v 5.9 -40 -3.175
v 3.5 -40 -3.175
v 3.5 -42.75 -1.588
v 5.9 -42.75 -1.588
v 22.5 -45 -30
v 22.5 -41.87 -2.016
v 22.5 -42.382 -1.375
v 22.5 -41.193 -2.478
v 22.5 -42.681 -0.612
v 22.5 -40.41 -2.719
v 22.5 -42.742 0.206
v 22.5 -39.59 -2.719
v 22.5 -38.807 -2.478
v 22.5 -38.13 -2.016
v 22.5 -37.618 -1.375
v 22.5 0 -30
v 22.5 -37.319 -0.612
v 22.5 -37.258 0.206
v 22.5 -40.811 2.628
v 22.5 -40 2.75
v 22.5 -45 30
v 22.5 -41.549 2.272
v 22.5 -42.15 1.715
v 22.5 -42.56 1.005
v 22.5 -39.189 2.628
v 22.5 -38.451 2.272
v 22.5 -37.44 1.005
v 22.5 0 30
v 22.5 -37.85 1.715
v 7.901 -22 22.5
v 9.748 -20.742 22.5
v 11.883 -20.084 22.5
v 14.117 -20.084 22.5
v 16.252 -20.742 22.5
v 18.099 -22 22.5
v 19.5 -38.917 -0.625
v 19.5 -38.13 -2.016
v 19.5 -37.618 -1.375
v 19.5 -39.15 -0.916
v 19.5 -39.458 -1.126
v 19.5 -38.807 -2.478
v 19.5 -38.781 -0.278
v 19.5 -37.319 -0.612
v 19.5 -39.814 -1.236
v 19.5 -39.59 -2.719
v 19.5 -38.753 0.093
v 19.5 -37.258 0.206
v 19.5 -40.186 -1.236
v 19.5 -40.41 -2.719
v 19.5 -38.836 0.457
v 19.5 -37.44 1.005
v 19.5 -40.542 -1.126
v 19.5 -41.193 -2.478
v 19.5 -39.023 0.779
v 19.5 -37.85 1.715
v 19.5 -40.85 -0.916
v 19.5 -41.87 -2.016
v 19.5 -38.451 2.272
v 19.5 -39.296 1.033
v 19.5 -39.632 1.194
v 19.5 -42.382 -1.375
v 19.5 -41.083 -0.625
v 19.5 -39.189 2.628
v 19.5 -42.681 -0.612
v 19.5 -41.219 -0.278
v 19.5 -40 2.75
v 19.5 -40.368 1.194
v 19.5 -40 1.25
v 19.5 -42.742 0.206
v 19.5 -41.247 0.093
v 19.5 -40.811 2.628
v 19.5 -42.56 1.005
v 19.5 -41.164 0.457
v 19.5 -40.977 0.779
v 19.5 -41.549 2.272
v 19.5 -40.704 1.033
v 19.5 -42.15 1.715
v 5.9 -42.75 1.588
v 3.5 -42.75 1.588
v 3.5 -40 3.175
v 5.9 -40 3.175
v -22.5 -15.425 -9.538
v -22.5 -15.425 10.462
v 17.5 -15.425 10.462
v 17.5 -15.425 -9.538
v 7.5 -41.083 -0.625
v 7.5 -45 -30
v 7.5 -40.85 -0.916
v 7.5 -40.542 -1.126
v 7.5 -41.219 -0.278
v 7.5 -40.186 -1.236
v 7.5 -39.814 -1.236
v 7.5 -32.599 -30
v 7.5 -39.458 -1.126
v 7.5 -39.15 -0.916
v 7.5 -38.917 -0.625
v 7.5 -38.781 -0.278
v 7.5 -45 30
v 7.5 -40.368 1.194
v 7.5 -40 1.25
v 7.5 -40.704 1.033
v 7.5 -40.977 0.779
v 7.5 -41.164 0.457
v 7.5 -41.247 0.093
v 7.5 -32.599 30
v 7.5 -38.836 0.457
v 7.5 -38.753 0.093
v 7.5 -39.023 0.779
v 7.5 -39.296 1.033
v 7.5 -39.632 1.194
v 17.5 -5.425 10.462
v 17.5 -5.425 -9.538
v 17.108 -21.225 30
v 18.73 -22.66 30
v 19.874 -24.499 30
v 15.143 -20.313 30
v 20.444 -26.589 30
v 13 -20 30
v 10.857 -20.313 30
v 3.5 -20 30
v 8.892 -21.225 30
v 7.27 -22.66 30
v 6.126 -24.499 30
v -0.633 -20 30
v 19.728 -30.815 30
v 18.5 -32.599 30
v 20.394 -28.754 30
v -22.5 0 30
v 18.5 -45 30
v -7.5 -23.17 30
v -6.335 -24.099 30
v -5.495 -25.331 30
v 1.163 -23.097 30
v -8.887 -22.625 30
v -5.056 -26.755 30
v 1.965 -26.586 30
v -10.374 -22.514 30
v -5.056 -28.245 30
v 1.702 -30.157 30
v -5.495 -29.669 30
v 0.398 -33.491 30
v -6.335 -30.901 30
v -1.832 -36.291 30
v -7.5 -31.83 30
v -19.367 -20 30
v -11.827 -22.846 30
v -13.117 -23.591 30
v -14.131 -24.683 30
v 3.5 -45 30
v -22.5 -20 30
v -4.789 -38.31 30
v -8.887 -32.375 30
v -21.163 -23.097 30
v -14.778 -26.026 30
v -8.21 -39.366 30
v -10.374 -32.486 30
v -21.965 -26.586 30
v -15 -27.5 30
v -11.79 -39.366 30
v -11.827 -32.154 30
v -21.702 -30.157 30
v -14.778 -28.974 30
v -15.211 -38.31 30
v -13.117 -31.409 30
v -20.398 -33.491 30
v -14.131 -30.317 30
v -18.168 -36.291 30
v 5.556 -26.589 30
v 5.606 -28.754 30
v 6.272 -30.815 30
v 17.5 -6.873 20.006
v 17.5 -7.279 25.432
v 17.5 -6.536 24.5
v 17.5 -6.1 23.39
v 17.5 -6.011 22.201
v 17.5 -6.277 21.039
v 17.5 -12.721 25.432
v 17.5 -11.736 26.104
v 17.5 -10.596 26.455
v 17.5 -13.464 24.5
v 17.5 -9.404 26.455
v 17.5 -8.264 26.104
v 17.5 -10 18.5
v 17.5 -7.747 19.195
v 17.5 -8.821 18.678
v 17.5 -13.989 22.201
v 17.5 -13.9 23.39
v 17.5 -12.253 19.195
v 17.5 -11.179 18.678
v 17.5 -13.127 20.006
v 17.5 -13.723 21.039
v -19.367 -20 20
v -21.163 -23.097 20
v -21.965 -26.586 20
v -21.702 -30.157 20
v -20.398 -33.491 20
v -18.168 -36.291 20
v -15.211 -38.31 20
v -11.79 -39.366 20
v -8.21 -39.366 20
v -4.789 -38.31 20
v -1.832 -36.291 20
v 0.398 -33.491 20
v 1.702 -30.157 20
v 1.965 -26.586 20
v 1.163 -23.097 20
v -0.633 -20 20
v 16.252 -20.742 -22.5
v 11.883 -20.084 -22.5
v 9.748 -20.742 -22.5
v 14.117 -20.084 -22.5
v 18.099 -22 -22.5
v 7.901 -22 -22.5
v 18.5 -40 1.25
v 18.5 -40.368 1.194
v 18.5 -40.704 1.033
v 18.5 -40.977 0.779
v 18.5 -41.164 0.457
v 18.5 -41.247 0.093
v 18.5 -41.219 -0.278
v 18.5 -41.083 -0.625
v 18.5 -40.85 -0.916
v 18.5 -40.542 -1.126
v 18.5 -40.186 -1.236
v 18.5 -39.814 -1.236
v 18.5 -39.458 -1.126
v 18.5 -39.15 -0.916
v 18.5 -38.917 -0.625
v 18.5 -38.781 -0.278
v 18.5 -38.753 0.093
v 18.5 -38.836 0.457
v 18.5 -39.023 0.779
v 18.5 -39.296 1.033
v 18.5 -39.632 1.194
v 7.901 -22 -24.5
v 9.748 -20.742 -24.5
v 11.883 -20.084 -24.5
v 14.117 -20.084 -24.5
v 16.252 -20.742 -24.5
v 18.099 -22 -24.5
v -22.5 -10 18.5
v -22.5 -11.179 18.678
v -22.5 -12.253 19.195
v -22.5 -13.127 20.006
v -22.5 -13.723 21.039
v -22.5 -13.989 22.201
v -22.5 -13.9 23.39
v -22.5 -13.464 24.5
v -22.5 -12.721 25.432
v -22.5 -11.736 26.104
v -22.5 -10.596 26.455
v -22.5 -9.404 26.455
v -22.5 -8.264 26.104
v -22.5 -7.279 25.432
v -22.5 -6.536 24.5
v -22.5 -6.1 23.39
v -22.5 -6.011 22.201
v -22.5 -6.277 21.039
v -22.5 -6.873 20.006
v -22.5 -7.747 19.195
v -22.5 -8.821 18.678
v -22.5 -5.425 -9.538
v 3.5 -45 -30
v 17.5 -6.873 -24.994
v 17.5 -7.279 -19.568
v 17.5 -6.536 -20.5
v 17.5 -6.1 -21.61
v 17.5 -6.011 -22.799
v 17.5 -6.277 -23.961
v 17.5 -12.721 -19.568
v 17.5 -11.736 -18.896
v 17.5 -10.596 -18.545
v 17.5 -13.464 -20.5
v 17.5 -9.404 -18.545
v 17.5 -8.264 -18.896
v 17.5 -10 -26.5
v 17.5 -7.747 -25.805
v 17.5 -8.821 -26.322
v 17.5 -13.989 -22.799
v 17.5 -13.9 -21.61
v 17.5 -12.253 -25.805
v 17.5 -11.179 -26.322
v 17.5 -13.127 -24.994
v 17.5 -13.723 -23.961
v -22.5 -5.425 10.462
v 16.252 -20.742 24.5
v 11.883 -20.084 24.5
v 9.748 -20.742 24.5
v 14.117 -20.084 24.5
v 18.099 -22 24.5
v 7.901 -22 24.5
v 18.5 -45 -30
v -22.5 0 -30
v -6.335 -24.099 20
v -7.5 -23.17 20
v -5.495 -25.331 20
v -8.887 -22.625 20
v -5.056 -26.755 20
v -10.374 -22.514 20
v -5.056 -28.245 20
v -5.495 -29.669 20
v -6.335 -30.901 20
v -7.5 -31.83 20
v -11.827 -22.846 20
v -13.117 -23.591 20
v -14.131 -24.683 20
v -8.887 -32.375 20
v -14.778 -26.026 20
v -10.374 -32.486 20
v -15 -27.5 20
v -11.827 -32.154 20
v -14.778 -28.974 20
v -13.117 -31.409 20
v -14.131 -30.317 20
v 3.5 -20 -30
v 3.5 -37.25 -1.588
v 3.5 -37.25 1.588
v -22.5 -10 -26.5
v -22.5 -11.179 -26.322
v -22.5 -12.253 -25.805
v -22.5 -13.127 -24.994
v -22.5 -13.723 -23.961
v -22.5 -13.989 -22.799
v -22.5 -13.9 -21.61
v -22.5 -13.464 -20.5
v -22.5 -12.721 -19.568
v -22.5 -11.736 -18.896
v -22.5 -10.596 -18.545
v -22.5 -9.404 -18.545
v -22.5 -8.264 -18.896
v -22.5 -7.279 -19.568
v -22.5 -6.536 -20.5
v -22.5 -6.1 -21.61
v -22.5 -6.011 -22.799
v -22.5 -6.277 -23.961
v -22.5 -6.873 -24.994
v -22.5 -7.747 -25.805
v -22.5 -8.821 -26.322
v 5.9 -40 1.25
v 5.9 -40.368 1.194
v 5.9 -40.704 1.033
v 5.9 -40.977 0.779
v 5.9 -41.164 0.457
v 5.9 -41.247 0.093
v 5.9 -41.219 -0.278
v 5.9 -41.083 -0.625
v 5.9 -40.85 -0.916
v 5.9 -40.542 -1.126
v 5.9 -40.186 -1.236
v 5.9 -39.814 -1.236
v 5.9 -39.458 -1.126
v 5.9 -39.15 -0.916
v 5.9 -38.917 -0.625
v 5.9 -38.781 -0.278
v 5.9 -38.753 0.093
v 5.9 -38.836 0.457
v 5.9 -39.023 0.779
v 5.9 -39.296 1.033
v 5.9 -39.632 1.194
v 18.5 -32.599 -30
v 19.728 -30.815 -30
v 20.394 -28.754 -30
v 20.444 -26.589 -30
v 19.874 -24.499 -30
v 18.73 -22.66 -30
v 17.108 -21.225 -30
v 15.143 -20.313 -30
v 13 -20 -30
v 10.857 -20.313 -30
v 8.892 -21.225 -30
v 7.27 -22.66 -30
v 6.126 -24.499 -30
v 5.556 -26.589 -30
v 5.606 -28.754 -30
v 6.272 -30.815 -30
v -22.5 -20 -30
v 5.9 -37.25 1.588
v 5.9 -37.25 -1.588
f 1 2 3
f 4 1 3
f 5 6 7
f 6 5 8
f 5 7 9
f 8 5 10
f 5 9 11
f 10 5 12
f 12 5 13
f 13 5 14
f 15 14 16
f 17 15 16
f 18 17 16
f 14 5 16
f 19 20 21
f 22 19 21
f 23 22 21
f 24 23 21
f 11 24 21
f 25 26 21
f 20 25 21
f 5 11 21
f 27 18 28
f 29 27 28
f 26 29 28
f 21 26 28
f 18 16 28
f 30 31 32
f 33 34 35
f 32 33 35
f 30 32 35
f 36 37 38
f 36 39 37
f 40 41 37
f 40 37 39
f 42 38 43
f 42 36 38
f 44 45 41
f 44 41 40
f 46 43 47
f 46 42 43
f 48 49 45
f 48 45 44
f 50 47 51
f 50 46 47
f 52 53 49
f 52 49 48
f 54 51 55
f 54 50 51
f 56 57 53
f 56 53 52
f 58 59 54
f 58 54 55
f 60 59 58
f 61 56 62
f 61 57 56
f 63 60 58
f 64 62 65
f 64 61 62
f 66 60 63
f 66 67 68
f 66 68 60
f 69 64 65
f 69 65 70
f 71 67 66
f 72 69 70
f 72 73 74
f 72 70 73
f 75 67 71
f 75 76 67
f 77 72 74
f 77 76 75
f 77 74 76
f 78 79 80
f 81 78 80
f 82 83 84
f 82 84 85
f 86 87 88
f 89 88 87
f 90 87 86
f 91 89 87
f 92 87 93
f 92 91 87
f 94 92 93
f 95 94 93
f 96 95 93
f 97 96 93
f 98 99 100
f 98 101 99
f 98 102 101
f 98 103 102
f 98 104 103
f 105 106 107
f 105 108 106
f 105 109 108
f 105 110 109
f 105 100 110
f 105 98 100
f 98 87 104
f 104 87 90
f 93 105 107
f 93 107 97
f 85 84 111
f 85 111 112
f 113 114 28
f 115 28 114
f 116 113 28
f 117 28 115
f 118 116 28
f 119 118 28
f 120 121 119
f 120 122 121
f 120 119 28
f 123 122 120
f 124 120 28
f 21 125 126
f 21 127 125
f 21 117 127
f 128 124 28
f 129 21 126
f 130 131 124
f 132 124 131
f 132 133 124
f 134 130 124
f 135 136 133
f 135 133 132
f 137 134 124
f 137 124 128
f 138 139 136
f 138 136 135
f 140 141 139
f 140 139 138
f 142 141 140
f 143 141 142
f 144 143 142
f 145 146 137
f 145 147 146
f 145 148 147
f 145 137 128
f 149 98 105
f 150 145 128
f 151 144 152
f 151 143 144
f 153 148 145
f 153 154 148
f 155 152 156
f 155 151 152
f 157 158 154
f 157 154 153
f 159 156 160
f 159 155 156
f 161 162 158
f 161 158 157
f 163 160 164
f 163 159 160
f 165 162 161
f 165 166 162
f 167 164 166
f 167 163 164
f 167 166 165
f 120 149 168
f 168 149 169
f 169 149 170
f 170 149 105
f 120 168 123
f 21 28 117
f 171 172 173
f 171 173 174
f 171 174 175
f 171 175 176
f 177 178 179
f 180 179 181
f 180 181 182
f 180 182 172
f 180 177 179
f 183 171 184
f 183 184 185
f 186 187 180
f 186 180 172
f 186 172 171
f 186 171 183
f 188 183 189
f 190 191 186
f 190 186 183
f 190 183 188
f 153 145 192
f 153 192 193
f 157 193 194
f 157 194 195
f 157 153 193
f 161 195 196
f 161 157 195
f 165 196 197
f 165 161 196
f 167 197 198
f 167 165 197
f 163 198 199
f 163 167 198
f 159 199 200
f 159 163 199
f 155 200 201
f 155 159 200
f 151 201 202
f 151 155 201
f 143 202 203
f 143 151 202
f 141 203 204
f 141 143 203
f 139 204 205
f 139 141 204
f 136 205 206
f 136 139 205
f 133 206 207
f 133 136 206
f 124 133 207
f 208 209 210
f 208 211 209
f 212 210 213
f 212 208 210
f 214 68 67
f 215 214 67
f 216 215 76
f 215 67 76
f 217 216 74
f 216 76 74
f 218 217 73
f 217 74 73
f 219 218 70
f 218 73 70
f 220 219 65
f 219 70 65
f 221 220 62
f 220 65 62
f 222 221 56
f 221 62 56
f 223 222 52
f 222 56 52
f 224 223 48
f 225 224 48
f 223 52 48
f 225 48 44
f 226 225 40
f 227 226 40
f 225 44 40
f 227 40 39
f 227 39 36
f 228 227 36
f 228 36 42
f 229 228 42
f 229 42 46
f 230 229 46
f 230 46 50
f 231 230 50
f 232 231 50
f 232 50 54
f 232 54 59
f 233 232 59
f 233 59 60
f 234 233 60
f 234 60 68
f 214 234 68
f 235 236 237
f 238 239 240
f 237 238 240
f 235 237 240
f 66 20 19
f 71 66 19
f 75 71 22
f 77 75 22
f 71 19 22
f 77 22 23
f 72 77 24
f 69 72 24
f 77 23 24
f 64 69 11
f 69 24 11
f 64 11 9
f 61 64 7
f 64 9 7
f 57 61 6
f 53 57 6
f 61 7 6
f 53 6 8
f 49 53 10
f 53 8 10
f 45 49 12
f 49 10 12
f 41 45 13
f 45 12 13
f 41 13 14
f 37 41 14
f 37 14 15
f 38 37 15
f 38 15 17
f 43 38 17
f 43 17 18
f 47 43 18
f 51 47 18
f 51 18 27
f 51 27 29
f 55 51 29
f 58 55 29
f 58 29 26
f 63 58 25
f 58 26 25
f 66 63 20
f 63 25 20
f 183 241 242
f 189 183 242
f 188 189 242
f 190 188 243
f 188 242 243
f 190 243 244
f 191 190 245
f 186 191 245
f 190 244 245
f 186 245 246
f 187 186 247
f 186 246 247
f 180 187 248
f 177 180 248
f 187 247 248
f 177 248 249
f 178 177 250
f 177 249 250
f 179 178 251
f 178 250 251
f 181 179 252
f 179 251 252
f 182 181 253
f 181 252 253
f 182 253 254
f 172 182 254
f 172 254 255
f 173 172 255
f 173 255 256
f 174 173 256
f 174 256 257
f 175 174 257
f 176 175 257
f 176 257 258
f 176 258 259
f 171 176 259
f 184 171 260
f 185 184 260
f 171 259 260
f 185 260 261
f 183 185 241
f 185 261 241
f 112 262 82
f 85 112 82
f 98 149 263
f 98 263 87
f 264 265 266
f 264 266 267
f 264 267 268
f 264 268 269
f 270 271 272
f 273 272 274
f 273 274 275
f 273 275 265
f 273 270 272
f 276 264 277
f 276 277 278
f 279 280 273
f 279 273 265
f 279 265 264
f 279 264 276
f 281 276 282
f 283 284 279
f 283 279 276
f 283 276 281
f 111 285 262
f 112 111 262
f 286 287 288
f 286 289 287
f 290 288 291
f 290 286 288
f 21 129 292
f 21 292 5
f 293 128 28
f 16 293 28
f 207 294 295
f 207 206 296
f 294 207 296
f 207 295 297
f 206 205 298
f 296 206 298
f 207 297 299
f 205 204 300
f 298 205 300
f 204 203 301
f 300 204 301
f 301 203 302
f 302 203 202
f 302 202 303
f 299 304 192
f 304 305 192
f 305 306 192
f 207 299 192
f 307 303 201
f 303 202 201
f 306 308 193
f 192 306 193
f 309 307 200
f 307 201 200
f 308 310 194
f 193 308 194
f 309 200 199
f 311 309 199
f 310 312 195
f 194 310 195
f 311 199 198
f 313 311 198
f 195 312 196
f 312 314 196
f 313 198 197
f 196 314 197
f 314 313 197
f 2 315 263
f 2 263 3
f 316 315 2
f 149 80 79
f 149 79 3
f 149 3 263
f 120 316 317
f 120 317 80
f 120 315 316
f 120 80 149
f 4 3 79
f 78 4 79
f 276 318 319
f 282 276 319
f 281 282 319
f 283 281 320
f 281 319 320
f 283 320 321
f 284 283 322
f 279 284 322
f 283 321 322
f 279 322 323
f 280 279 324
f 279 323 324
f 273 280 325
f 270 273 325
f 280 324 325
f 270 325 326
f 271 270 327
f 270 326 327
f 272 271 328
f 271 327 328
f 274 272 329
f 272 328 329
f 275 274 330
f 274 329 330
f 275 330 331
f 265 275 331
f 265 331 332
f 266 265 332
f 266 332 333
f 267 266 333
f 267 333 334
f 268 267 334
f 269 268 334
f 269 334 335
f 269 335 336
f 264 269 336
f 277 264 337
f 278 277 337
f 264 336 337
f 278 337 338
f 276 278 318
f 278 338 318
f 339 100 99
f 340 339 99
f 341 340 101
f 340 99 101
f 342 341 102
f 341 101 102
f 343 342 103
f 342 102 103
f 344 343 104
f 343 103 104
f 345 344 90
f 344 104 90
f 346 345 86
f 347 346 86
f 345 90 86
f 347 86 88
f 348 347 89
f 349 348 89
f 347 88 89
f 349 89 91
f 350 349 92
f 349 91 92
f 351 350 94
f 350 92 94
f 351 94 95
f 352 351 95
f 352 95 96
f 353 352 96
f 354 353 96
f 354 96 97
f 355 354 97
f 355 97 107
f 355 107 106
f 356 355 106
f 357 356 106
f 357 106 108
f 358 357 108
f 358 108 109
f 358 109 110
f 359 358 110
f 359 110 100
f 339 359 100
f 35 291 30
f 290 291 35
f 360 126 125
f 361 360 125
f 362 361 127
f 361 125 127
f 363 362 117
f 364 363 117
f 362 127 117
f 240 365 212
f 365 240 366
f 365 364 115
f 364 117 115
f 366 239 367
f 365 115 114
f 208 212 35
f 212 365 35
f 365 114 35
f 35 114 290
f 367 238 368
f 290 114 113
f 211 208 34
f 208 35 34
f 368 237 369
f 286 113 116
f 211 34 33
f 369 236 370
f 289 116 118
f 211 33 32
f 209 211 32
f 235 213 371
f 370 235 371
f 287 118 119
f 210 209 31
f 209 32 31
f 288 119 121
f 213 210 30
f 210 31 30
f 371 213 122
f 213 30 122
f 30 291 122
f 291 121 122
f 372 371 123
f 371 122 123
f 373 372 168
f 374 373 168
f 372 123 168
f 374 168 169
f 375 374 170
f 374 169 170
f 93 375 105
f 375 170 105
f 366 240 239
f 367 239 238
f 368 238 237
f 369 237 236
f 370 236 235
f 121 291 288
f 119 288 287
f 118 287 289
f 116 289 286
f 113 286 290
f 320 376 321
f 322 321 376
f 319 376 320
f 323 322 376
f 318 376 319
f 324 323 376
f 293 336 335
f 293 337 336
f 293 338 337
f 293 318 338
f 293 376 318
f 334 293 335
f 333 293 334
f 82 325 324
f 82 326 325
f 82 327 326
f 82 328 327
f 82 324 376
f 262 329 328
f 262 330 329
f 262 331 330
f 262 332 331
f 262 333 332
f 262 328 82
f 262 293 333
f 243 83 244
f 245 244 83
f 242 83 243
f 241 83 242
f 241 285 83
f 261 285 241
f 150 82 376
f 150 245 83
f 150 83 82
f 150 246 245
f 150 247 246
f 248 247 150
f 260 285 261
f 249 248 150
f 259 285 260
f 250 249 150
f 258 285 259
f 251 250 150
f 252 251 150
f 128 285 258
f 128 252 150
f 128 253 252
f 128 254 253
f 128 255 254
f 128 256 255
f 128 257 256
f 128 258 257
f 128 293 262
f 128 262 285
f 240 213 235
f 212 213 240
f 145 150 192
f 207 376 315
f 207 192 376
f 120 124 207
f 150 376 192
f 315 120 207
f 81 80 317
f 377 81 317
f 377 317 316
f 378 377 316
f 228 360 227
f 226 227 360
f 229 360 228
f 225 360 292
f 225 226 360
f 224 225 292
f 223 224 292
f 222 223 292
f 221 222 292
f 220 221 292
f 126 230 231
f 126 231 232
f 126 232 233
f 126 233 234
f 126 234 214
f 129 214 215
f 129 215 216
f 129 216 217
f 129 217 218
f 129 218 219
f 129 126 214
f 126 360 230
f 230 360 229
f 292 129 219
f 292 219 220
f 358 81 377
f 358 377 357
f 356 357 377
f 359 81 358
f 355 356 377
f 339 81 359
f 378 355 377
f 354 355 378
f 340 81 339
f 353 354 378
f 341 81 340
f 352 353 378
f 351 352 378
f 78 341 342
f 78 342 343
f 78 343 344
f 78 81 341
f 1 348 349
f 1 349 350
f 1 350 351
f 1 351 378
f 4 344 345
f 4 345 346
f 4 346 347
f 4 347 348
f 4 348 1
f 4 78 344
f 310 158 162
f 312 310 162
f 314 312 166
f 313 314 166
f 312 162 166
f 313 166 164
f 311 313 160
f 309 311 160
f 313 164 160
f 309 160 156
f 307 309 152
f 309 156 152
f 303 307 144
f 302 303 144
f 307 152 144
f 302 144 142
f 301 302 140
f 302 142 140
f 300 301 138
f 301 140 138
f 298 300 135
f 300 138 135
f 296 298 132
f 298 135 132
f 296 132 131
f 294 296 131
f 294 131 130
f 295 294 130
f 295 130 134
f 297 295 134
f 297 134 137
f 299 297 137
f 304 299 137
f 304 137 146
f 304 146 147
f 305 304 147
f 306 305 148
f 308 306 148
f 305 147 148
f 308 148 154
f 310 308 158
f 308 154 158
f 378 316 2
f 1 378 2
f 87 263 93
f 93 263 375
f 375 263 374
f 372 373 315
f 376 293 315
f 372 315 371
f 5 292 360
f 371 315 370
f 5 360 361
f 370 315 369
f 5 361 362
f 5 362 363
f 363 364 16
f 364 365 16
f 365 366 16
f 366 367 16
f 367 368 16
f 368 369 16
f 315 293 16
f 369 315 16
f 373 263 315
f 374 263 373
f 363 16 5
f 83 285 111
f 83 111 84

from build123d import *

# Parameters (mm, degrees)
SKETCH_W        = 45
SKETCH_H        = 60
PAD_DEPTH       = 20
SKETCH001_R     = 4
POCKET_DEPTH    = 40
SKETCH002_W     = 20
SKETCH002_H     = 10
POCKET001_DEPTH = 40
SKETCH003_W     = 19
SKETCH003_H     = 60
PAD001_DEPTH    = 25
POCKET002_DEPTH = 60
SKETCH005_W     = 19
SKETCH005_H     = 2
PAD002_DEPTH    = 2
SKETCH006_R     = 12
SKETCH006_R_2   = 5
PAD003_DEPTH    = 10
SKETCH007_R     = 1.25
POCKET003_DEPTH = 45.001
SKETCH008_R     = 2.75
POCKET004_DEPTH = 3
POCKET005_DEPTH = 2.4


with BuildPart() as part:
    # Sketch → Pad (new body)
    with BuildSketch(Plane.XZ):
        Rectangle(SKETCH_W, SKETCH_H)
    extrude(amount=PAD_DEPTH)

    # Sketch001 (on Face4 of Pad) → Pocket (cut)
    with BuildSketch(Plane(origin=(-22.5, 0, 0), x_dir=(0, 0, -1), z_dir=(-1, 0, 0))):
        with Locations((-22.5, 10)):
            Circle(SKETCH001_R)
        with Locations((22.5, 10)):
            Circle(SKETCH001_R)
    extrude(amount=-POCKET_DEPTH, mode=Mode.SUBTRACT)

    # Sketch002 (on Face2 of Pocket) → Pocket001 (cut)
    with BuildSketch(Plane(origin=(-22.5, 0, 0), x_dir=(0, 0, -1), z_dir=(-1, 0, 0))):
        with Locations((-0.462425, 10.424613)):
            Rectangle(SKETCH002_W, SKETCH002_H)
    extrude(amount=-POCKET001_DEPTH, mode=Mode.SUBTRACT)

    # Sketch003 (on Face5 of Pocket001) → Pad001 (join)
    with BuildSketch(Plane.XZ.offset(20)):
        with Locations((13, 0)):
            Rectangle(SKETCH003_W, SKETCH003_H)
    extrude(amount=PAD001_DEPTH)

    # Sketch004 (on Face6 of Pad001) → Pocket002 (cut)
    with BuildSketch(Plane(origin=(0, 0, 30), x_dir=(-1, 0, 0), z_dir=(0, 0, 1))):
        with BuildLine():
            Line((-18.5, 45), (-7.5, 45))
            Line((-7.5, 45), (-7.5, 32.59902))
            ThreePointArc((-18.5, 32.59902), (-13, 20), (-7.5, 32.59902))
            Line((-18.5, 32.59902), (-18.5, 45))
        make_face()
    extrude(amount=-POCKET002_DEPTH, mode=Mode.SUBTRACT)

    # Sketch005 (on Face4 of Pocket002) → Pad002 (join)
    with BuildSketch(Plane.XZ.offset(20)):
        with Locations((13, 23.5)):
            Rectangle(SKETCH005_W, SKETCH005_H)
        with Locations((13, -23.5)):
            Rectangle(SKETCH005_W, SKETCH005_H)
    extrude(amount=PAD002_DEPTH)

    # Sketch006 (on Face1 of Pad002) → Pad003 (join)
    with BuildSketch(Plane(origin=(0, 0, 30), x_dir=(-1, 0, 0), z_dir=(0, 0, 1))):
        with Locations((10, 27.5)):
            Circle(SKETCH006_R)
        with Locations((10, 27.5)):
            Circle(SKETCH006_R_2, mode=Mode.SUBTRACT)
    extrude(amount=-PAD003_DEPTH)

    # Sketch007 (on Face10 of Pad003) → Pocket003 (cut, through all)
    with BuildSketch(Plane(origin=(22.5, 0, 0), x_dir=(0, 0, 1), z_dir=(1, 0, 0))):
        with Locations((0, 40)):
            Circle(SKETCH007_R)
    extrude(amount=-POCKET003_DEPTH, mode=Mode.SUBTRACT)

    # Sketch008 (on Face10 of Pocket003) → Pocket004 (cut)
    with BuildSketch(Plane(origin=(22.5, 0, 0), x_dir=(0, 0, 1), z_dir=(1, 0, 0))):
        with Locations((0, 40)):
            Circle(SKETCH008_R)
    extrude(amount=-POCKET004_DEPTH, mode=Mode.SUBTRACT)

    # Sketch009 (on Face18 of Pocket004) → Pocket005 (cut)
    with BuildSketch(Plane(origin=(3.5, 0, 0), x_dir=(0, 0, -1), z_dir=(-1, 0, 0))):
        Polygon((1.587713, 37.25), (3.175426, 40), (1.587713, 42.75), (-1.587713, 42.75), (-3.175426, 40), (-1.587713, 37.25), align=None)
    extrude(amount=-POCKET005_DEPTH, mode=Mode.SUBTRACT)


solid = part.part
